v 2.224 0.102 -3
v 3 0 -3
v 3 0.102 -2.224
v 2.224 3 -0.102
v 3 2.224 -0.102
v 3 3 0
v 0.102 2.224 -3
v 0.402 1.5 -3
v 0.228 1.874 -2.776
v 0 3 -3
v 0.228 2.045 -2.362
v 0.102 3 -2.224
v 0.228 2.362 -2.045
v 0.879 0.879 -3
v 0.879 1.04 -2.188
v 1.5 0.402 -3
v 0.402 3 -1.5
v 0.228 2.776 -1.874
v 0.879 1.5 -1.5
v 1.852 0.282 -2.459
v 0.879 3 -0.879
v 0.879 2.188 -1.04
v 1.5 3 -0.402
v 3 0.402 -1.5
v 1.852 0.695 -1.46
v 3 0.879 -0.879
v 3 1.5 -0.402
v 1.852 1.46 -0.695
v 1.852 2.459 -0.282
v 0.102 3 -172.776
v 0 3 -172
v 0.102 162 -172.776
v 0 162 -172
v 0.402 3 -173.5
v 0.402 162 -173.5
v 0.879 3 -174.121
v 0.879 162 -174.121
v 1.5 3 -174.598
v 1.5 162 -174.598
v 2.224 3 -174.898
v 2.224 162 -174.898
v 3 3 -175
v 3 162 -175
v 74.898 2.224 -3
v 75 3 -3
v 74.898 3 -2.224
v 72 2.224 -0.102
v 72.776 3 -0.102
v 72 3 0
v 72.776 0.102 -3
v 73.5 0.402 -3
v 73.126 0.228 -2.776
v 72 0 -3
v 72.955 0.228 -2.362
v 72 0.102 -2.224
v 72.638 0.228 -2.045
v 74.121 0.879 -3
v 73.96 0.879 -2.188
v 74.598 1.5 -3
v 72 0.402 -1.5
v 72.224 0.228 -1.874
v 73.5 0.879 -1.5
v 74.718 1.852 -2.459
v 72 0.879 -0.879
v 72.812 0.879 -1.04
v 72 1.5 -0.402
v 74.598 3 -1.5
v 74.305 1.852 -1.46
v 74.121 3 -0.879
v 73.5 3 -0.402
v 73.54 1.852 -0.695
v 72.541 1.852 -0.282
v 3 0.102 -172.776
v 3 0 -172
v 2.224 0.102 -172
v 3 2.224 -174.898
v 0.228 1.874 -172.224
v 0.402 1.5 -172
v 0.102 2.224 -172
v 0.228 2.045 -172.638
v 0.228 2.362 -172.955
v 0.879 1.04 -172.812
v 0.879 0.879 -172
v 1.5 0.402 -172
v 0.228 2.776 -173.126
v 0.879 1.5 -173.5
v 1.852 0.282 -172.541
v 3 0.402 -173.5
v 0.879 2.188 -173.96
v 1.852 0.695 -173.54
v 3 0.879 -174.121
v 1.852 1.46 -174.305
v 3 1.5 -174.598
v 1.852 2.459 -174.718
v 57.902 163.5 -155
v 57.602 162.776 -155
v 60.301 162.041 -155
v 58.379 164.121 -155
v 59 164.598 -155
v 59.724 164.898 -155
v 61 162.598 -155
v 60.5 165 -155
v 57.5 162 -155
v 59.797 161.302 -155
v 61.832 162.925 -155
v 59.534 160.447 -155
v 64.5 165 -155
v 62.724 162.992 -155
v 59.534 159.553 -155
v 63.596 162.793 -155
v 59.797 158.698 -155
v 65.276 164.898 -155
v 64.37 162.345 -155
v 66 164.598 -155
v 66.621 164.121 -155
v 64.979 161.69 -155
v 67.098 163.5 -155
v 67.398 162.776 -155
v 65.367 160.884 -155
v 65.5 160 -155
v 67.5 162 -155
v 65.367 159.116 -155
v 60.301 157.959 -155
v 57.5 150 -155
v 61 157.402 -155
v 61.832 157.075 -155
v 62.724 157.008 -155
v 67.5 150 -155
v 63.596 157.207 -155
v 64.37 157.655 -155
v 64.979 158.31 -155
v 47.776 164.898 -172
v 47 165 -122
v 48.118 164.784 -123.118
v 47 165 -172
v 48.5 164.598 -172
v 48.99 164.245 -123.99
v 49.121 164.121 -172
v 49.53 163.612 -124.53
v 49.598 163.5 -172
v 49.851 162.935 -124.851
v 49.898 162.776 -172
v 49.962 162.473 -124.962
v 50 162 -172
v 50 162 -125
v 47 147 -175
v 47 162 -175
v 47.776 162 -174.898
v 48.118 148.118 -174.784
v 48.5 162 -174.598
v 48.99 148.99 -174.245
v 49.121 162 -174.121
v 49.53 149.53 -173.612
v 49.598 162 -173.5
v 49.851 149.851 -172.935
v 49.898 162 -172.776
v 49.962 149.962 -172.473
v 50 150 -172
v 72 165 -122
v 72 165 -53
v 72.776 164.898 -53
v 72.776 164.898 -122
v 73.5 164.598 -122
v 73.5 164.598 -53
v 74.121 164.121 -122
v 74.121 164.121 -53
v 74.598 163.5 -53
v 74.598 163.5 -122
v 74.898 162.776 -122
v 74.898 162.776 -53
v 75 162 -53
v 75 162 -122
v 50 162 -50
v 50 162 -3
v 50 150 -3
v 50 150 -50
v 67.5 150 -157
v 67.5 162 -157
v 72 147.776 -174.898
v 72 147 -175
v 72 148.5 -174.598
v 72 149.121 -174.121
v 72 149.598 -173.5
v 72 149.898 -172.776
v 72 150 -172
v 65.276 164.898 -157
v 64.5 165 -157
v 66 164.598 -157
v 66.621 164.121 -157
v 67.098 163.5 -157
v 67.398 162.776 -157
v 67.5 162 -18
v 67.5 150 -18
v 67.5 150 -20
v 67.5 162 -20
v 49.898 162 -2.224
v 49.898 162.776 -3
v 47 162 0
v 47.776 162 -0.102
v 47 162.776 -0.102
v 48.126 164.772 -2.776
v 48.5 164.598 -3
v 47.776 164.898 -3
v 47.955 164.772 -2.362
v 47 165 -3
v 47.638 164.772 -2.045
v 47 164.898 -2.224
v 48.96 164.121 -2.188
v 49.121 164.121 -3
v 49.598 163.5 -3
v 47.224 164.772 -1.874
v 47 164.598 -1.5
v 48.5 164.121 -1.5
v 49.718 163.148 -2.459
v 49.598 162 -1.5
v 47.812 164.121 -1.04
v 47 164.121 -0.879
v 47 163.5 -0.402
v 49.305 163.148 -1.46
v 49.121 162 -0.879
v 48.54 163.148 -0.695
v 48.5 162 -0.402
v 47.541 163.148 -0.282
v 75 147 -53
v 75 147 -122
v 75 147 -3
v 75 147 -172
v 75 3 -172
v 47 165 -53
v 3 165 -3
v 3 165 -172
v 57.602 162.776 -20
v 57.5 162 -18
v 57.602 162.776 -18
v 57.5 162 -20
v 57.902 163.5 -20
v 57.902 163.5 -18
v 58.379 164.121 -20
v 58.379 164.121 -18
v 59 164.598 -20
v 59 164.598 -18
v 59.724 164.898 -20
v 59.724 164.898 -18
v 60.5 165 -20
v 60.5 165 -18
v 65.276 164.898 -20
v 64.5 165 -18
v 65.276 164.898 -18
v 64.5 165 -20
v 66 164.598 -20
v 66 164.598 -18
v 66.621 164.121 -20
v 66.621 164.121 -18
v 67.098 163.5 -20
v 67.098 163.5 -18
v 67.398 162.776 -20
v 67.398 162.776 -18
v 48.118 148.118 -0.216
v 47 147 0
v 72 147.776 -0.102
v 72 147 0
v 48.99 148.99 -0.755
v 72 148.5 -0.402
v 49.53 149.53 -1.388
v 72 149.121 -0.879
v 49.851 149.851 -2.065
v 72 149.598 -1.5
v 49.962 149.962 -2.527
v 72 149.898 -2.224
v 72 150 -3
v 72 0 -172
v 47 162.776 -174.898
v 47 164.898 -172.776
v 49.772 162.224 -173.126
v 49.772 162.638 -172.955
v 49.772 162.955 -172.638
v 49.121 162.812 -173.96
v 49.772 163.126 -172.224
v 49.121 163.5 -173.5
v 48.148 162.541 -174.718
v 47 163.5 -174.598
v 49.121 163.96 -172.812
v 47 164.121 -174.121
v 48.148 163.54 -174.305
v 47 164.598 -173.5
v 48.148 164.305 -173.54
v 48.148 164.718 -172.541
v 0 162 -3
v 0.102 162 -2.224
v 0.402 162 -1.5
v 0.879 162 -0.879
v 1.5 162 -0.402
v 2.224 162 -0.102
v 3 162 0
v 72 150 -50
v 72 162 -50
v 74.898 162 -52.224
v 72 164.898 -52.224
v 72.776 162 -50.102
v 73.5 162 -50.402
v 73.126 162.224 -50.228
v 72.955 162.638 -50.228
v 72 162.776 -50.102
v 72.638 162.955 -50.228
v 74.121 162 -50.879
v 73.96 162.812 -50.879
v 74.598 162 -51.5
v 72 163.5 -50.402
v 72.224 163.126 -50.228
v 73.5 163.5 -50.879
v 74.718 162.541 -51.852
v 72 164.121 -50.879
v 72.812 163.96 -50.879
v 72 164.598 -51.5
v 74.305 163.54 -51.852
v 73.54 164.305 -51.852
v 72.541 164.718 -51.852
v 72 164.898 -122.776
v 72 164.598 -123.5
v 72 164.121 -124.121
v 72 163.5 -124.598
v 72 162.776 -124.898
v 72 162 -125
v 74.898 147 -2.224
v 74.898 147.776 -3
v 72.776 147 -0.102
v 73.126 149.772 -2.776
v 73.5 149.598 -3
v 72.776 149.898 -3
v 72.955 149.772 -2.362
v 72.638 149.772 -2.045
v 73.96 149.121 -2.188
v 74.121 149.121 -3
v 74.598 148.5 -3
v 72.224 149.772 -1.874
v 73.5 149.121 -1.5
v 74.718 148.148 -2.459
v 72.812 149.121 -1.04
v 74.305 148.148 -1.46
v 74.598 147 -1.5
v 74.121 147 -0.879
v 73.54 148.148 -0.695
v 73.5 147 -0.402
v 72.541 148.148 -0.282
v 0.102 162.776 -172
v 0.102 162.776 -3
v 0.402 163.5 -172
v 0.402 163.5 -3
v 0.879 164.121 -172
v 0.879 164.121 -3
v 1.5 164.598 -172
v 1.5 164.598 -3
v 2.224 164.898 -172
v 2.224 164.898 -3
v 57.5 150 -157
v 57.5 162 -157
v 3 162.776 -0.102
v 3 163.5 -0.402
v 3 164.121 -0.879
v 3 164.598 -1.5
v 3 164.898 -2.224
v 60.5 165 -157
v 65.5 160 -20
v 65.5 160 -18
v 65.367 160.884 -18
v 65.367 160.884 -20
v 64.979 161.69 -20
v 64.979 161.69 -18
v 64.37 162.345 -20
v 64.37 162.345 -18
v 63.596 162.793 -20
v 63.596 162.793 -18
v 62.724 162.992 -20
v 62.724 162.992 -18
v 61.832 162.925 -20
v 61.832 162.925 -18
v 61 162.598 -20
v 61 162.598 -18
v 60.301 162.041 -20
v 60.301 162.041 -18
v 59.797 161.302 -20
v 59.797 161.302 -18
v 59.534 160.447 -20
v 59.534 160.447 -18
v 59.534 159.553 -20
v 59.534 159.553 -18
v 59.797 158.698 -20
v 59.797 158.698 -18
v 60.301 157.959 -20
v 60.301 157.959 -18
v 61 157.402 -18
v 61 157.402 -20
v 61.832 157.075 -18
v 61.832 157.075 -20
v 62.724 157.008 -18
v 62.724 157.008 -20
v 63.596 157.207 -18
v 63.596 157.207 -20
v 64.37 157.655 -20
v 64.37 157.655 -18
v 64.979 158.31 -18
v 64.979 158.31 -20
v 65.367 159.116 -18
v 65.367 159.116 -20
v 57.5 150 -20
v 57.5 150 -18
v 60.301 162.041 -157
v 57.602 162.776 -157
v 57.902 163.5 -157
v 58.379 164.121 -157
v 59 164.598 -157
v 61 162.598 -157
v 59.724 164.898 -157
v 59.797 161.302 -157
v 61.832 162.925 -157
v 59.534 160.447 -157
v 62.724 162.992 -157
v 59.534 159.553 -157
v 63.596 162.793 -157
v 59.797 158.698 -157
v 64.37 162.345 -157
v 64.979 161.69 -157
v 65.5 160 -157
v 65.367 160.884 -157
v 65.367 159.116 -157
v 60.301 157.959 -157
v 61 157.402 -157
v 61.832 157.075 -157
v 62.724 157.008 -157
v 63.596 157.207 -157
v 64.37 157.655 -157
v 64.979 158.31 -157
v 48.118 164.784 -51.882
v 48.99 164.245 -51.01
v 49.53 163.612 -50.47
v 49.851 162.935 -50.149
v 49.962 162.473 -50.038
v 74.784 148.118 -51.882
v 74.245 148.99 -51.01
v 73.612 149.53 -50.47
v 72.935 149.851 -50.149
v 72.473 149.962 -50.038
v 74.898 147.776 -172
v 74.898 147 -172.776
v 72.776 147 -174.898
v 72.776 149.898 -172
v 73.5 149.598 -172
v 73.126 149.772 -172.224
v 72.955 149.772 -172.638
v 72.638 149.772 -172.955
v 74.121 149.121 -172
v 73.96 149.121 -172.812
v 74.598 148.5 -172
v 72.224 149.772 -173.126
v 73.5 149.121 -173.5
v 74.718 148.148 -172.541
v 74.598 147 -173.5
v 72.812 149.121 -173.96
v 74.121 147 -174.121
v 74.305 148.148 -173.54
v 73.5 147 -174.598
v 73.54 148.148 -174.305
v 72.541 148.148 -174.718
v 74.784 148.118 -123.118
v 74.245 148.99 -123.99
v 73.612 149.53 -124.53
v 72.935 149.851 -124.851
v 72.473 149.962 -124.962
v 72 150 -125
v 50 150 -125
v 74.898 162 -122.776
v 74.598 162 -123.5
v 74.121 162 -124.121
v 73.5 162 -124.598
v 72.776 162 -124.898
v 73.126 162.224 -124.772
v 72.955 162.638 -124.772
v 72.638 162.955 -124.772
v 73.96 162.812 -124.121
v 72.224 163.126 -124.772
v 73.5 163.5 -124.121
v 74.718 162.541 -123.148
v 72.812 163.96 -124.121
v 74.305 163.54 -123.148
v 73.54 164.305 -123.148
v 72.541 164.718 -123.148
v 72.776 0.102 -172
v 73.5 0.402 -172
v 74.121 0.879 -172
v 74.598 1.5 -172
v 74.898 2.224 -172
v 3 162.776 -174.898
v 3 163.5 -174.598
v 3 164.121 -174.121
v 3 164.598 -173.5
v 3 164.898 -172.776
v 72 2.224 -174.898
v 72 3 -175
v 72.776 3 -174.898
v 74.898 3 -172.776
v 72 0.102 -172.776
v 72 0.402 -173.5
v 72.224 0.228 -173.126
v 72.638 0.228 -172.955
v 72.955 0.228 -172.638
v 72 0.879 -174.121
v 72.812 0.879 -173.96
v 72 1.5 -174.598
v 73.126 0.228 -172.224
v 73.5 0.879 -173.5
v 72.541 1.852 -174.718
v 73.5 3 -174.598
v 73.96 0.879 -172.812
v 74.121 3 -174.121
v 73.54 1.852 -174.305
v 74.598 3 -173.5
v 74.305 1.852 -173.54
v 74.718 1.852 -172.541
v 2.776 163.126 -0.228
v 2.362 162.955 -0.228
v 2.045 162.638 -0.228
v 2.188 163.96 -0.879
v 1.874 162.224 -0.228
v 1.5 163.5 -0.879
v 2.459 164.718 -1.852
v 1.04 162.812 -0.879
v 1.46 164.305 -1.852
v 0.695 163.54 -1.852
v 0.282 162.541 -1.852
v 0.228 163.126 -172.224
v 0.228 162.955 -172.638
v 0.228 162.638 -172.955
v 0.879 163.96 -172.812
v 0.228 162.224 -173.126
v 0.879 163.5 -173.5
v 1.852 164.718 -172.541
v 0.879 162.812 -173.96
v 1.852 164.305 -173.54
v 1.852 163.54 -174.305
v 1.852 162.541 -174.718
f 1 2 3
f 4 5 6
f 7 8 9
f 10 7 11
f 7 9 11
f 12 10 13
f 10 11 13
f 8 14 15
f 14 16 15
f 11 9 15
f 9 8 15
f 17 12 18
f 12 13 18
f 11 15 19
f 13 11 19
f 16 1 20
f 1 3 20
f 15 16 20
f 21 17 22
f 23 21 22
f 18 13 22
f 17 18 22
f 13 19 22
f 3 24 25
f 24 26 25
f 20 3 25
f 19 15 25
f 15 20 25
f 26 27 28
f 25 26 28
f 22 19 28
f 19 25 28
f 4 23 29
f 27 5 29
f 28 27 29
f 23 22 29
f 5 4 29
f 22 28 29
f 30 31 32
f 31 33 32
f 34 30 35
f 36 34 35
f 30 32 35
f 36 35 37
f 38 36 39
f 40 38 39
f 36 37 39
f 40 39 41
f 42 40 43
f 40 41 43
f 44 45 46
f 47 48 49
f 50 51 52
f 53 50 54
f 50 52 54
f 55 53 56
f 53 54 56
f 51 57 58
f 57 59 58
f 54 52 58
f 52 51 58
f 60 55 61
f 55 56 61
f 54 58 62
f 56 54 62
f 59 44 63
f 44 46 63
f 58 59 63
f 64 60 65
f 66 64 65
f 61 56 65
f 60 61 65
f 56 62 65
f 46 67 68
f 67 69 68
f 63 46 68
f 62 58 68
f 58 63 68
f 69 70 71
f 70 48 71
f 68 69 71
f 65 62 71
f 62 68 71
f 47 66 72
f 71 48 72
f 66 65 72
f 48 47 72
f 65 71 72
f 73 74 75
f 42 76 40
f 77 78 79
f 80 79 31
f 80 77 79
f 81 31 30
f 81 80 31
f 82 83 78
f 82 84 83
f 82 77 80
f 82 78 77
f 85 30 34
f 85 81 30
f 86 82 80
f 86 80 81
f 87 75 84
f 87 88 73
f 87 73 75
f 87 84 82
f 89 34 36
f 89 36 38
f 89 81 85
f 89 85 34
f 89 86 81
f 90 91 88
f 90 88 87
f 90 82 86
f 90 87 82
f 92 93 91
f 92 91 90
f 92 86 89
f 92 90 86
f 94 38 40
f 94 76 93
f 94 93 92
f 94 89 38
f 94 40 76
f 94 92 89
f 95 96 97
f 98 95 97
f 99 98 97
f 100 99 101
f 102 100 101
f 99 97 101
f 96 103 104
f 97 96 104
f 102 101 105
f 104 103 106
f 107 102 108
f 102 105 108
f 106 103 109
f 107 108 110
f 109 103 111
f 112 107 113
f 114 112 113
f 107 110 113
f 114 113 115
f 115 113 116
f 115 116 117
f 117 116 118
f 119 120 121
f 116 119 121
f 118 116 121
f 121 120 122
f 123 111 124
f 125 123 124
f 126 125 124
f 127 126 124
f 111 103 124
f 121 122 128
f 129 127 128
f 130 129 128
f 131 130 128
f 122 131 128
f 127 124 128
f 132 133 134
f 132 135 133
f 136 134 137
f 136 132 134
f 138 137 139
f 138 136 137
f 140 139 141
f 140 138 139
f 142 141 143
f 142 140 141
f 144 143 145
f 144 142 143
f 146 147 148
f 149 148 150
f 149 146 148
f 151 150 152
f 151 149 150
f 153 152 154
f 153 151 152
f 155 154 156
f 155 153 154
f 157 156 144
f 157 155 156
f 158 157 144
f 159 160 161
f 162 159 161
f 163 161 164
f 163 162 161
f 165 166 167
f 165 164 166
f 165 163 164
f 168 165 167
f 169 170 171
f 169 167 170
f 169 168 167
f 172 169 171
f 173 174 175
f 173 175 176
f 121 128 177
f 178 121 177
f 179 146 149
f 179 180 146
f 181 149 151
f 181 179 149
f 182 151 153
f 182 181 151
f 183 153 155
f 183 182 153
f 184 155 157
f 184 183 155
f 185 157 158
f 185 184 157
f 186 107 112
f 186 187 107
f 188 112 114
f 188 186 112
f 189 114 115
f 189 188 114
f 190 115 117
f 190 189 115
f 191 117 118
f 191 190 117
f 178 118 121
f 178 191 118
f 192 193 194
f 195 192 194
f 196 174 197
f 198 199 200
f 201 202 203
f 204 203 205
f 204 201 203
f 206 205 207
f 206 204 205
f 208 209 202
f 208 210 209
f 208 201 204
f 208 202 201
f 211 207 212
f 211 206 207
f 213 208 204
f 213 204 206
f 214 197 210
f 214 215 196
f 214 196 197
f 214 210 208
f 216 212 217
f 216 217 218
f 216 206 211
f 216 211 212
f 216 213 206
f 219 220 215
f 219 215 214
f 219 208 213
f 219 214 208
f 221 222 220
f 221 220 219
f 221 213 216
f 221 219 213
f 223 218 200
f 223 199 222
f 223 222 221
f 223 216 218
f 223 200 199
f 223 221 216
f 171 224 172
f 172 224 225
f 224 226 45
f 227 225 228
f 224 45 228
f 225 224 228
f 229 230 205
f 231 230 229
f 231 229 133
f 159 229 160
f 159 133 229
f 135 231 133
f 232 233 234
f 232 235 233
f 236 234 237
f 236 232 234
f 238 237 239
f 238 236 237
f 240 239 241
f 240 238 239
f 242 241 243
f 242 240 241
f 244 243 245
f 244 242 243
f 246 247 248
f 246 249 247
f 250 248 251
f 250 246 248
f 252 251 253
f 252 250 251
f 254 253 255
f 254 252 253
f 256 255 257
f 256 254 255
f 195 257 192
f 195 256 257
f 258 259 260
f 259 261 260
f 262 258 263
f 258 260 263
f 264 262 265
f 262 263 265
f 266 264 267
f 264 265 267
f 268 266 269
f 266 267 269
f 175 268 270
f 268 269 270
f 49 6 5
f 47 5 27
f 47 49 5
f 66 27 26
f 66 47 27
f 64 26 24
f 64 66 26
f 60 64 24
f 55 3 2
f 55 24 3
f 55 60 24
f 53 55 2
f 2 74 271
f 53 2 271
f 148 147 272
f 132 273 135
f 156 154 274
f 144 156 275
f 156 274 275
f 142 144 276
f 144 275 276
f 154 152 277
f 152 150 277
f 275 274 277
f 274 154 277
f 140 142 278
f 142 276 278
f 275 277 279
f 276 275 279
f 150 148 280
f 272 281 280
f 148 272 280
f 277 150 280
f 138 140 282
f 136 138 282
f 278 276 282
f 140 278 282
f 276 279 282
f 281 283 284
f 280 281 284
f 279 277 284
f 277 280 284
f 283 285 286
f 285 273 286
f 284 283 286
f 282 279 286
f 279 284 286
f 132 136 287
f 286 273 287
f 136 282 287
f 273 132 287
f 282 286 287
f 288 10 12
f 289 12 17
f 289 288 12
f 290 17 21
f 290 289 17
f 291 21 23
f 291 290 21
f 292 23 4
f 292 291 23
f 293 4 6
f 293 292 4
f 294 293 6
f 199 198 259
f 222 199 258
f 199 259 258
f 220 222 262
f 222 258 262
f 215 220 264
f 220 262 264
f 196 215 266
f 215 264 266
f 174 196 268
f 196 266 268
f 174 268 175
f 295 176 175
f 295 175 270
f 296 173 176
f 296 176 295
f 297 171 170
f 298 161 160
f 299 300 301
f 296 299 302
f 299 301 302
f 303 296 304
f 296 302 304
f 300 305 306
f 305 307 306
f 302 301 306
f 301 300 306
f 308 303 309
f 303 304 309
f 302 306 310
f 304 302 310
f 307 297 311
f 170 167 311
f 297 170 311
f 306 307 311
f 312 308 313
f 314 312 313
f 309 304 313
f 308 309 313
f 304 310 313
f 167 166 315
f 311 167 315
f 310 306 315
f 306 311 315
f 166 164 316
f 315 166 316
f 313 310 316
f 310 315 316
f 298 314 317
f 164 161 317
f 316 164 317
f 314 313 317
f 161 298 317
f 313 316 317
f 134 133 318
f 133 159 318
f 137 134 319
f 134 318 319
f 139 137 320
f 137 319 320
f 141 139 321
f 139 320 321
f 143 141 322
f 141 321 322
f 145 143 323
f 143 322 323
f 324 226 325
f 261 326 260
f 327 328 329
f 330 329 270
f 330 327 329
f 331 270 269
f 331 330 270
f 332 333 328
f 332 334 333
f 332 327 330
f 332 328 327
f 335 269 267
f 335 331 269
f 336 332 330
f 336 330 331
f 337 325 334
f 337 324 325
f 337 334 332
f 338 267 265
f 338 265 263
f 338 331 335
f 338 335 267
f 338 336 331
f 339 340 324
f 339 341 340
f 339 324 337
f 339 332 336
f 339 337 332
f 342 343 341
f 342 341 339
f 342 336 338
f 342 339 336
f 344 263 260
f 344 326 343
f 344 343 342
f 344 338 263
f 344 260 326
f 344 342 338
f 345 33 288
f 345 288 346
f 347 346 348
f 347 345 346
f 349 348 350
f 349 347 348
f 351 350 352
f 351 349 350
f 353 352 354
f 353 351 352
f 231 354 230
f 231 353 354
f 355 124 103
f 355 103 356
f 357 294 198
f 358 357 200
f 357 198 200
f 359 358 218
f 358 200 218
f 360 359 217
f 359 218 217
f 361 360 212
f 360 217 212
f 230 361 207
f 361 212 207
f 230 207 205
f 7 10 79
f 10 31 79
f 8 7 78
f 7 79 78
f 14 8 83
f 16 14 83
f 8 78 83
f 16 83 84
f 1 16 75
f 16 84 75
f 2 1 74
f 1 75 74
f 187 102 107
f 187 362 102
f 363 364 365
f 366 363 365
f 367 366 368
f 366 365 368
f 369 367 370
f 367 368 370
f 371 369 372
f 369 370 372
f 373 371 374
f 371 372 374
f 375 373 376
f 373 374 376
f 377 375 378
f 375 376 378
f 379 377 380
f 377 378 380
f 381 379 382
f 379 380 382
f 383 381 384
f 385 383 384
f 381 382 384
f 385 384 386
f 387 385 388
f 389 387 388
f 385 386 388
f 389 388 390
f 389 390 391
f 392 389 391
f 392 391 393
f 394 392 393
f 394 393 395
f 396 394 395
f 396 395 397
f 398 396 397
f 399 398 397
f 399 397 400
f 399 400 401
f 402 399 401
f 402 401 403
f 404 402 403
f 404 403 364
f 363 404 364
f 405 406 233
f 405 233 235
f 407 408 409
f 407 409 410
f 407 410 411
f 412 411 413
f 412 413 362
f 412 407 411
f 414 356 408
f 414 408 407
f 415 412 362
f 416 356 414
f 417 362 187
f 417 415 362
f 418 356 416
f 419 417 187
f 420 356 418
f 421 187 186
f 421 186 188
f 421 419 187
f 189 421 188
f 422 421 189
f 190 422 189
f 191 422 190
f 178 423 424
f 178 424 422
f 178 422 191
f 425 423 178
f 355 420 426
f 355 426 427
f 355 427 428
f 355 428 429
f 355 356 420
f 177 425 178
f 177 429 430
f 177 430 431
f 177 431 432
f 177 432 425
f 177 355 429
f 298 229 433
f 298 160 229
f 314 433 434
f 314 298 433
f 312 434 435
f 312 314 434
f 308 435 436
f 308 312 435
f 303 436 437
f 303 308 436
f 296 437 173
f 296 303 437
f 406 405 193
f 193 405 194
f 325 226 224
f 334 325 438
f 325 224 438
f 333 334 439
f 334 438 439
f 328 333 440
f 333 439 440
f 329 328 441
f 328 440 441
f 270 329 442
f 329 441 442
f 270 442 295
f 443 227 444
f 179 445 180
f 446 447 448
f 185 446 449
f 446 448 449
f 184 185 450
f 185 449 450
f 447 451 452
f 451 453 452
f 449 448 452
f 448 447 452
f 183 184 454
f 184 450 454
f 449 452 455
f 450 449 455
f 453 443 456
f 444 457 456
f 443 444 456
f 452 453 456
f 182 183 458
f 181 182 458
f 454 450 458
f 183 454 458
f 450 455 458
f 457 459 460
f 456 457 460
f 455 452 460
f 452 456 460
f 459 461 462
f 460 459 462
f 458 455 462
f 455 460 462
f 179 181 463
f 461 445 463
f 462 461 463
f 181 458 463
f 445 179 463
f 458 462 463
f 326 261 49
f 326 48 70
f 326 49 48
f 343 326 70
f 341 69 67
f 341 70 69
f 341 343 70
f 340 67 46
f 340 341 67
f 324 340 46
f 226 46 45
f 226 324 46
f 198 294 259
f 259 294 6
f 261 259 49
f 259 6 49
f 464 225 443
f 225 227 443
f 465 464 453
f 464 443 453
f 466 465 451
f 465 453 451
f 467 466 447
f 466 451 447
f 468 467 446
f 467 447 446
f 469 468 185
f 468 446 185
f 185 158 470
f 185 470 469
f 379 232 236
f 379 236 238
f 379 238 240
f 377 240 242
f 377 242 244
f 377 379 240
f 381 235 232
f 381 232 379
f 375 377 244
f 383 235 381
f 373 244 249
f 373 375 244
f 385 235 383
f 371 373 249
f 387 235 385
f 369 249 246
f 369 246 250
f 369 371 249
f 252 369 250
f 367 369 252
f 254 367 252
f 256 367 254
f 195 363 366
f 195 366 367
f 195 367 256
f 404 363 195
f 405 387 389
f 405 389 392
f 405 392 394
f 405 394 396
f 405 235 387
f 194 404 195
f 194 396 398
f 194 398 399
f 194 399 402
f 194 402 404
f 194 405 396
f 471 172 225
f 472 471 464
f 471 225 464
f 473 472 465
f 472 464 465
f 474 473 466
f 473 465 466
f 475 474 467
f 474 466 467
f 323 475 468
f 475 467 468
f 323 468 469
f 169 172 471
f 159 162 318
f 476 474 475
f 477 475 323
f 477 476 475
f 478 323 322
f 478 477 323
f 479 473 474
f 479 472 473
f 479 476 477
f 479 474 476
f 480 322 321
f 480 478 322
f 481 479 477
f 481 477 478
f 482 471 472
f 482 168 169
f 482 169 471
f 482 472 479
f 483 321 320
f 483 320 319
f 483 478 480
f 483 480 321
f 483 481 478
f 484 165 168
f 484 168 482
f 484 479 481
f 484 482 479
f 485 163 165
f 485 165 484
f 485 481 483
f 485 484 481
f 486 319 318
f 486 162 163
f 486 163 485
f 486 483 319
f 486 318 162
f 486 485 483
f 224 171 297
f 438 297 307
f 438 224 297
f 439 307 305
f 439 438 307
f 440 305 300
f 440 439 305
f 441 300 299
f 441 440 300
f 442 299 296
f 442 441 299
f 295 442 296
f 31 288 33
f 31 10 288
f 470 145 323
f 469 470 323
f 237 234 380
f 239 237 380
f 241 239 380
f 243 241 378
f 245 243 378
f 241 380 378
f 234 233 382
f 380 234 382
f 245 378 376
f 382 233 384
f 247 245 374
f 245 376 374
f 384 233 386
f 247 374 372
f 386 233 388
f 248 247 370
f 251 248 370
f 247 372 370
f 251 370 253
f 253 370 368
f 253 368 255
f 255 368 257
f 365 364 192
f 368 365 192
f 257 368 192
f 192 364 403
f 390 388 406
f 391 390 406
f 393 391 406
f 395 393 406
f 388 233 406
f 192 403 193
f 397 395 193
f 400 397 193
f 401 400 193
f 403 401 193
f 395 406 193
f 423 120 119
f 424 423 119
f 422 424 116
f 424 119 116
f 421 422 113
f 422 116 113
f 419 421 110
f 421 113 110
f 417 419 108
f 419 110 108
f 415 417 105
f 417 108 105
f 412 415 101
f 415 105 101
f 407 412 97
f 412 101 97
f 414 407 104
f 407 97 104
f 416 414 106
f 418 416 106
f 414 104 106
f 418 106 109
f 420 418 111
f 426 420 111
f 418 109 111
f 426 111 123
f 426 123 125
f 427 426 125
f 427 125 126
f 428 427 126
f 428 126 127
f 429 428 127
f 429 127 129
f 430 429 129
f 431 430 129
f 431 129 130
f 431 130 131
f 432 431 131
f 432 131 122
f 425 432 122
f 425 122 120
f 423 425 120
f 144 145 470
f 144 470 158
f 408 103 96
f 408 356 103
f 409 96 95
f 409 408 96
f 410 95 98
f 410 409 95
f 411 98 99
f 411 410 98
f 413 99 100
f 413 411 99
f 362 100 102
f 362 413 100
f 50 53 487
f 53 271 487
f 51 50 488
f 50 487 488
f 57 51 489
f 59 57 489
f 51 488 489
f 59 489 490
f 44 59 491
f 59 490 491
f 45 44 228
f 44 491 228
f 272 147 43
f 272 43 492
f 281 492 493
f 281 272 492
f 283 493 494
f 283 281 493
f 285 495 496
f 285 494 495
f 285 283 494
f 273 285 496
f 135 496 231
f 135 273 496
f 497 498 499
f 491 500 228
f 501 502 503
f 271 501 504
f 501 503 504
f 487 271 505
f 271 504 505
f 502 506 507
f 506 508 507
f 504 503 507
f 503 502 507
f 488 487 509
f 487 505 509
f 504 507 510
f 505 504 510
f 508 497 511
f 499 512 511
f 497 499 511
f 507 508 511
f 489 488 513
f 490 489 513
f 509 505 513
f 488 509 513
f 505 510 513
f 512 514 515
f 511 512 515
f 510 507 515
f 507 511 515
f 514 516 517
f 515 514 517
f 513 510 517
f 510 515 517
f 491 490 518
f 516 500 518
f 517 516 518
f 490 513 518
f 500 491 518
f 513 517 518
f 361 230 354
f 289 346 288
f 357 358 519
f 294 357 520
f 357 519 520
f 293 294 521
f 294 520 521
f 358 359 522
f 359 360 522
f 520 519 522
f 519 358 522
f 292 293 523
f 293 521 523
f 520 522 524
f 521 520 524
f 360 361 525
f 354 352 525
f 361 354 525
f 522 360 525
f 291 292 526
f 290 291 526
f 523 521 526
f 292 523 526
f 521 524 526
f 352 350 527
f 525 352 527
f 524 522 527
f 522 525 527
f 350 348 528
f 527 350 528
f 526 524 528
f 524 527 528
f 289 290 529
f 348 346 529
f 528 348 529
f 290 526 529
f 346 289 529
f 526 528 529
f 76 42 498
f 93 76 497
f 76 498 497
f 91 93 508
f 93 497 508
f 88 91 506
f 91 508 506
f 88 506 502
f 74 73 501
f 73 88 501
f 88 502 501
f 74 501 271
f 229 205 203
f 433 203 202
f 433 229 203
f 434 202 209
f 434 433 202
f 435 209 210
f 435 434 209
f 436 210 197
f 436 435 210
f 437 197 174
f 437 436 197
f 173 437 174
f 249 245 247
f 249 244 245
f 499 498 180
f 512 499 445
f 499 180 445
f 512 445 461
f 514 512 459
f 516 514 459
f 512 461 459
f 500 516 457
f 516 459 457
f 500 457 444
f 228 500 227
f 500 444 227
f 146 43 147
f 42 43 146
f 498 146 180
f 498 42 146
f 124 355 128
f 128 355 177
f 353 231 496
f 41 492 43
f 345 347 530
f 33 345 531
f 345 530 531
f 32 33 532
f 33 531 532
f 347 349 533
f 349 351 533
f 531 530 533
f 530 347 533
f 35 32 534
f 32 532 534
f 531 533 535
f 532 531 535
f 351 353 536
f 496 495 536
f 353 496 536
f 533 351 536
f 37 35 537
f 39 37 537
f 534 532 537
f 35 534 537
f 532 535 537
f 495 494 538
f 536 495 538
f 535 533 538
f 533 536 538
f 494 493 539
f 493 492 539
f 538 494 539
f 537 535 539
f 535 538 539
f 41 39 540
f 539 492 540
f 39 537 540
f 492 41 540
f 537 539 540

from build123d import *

# Parameters (mm, degrees)
SKETCH_1_W          = 75
SKETCH_1_H          = 175
EXTRUDE_1_DEPTH     = 165
SKETCH_2_W          = 25
SKETCH_2_H          = 50
CUT_EXTRUDE_1_DEPTH = 15
SKETCH_3_W          = 10
SKETCH_3_H          = 2
EXTRUDE_2_DEPTH     = 15
EXTRUDE_2_2_DEPTH   = 15
SKETCH_4_R          = 3
CUT_EXTRUDE_3_DEPTH = 200
FILLET_1_R          = 3
FILLET_2_R          = 3
FILLET_3_R          = 3


with BuildPart() as part:
    # Эскиз1 → Бобышка-Вытянуть1 (new body)
    with BuildSketch(Plane(origin=(0, 0, 0), x_dir=(1, 0, 0), z_dir=(0, 1, 0))):
        with Locations((37.5, 87.5)):
            Rectangle(SKETCH_1_W, SKETCH_1_H)
    extrude(amount=EXTRUDE_1_DEPTH)

    # Эскиз2 → Вырез-Вытянуть1 (cut)
    with BuildSketch(Plane(origin=(0, 165, 0), x_dir=(1, 0, 0), z_dir=(0, 1, 0))):
        with Locations((62.5, 150)):
            Rectangle(SKETCH_2_W, SKETCH_2_H)
        with Locations((62.5, 25)):
            Rectangle(SKETCH_2_W, SKETCH_2_H)
    extrude(amount=-CUT_EXTRUDE_1_DEPTH, mode=Mode.SUBTRACT)

    # Скругление3
    fillet_3_edges = [part.edges().sort_by_distance(p)[0] for p in [
        (75, 165, -87.5),
        (25, 165, -175),
        (75, 75, -175),
        (75, 75, 0),
        (75, 150, -150),
        (75, 157.5, -125),
        (62.5, 150, -175),
        (50, 157.5, -175),
        (50, 165, -150),
        (62.5, 165, -125),
        (75, 150, -25),
        (75, 157.5, -50),
        (62.5, 150, 0),
        (50, 157.5, 0),
        (62.5, 165, -50),
        (50, 165, -25),
        (0, 165, -87.5),
        (37.5, 0, -175),
        (75, 0, -87.5),
        (37.5, 0, 0),
        (0, 0, -87.5),
        (25, 165, 0),
        (0, 82.5, -175),
        (0, 82.5, 0),
    ]]
    fillet(fillet_3_edges, radius=FILLET_3_R)


with BuildPart() as body_2:
    # Эскиз3 → Бобышка-Вытянуть2 (new body)
    with BuildSketch(Plane(origin=(0, 150, 0), x_dir=(1, 0, 0), z_dir=(0, 1, 0))):
        with Locations((62.5, 156)):
            Rectangle(SKETCH_3_W, SKETCH_3_H)
    extrude(amount=EXTRUDE_2_DEPTH)


with BuildPart() as body_3:
    # Эскиз3 → Extrude 2 2 (new body)
    with BuildSketch(Plane(origin=(0, 150, 0), x_dir=(1, 0, 0), z_dir=(0, 1, 0))):
        with Locations((62.5, 19)):
            Rectangle(SKETCH_3_W, SKETCH_3_H)
    extrude(amount=EXTRUDE_2_2_DEPTH)


with BuildPart() as cut_extrude_3_tool:
    # Эскиз4 → Вырез-Вытянуть3 (new body)
    with BuildSketch(Plane.XY.offset(-18)):
        with Locations((62.5, 160)):
            Circle(SKETCH_4_R)
    extrude(amount=-CUT_EXTRUDE_3_DEPTH)


with BuildPart() as body_3_1:
    add(body_3.part)

    # Вырез-Вытянуть3: cut by cut_extrude_3_tool
    add(cut_extrude_3_tool.part, mode=Mode.SUBTRACT)

    # Скругление1
    fillet_1_edges = [body_3_1.edges().sort_by_distance(p)[0] for p in [
        (67.5, 165, -19),
        (57.5, 165, -19),
    ]]
    fillet(fillet_1_edges, radius=FILLET_1_R)


with BuildPart() as body_2_1:
    add(body_2.part)

    # Вырез-Вытянуть3: cut by cut_extrude_3_tool
    add(cut_extrude_3_tool.part, mode=Mode.SUBTRACT)

    # Скругление2
    fillet_2_edges = [body_2_1.edges().sort_by_distance(p)[0] for p in [
        (67.5, 165, -156),
        (57.5, 165, -156),
    ]]
    fillet(fillet_2_edges, radius=FILLET_2_R)


solid = Compound([part.part, body_3_1.part, body_2_1.part])
